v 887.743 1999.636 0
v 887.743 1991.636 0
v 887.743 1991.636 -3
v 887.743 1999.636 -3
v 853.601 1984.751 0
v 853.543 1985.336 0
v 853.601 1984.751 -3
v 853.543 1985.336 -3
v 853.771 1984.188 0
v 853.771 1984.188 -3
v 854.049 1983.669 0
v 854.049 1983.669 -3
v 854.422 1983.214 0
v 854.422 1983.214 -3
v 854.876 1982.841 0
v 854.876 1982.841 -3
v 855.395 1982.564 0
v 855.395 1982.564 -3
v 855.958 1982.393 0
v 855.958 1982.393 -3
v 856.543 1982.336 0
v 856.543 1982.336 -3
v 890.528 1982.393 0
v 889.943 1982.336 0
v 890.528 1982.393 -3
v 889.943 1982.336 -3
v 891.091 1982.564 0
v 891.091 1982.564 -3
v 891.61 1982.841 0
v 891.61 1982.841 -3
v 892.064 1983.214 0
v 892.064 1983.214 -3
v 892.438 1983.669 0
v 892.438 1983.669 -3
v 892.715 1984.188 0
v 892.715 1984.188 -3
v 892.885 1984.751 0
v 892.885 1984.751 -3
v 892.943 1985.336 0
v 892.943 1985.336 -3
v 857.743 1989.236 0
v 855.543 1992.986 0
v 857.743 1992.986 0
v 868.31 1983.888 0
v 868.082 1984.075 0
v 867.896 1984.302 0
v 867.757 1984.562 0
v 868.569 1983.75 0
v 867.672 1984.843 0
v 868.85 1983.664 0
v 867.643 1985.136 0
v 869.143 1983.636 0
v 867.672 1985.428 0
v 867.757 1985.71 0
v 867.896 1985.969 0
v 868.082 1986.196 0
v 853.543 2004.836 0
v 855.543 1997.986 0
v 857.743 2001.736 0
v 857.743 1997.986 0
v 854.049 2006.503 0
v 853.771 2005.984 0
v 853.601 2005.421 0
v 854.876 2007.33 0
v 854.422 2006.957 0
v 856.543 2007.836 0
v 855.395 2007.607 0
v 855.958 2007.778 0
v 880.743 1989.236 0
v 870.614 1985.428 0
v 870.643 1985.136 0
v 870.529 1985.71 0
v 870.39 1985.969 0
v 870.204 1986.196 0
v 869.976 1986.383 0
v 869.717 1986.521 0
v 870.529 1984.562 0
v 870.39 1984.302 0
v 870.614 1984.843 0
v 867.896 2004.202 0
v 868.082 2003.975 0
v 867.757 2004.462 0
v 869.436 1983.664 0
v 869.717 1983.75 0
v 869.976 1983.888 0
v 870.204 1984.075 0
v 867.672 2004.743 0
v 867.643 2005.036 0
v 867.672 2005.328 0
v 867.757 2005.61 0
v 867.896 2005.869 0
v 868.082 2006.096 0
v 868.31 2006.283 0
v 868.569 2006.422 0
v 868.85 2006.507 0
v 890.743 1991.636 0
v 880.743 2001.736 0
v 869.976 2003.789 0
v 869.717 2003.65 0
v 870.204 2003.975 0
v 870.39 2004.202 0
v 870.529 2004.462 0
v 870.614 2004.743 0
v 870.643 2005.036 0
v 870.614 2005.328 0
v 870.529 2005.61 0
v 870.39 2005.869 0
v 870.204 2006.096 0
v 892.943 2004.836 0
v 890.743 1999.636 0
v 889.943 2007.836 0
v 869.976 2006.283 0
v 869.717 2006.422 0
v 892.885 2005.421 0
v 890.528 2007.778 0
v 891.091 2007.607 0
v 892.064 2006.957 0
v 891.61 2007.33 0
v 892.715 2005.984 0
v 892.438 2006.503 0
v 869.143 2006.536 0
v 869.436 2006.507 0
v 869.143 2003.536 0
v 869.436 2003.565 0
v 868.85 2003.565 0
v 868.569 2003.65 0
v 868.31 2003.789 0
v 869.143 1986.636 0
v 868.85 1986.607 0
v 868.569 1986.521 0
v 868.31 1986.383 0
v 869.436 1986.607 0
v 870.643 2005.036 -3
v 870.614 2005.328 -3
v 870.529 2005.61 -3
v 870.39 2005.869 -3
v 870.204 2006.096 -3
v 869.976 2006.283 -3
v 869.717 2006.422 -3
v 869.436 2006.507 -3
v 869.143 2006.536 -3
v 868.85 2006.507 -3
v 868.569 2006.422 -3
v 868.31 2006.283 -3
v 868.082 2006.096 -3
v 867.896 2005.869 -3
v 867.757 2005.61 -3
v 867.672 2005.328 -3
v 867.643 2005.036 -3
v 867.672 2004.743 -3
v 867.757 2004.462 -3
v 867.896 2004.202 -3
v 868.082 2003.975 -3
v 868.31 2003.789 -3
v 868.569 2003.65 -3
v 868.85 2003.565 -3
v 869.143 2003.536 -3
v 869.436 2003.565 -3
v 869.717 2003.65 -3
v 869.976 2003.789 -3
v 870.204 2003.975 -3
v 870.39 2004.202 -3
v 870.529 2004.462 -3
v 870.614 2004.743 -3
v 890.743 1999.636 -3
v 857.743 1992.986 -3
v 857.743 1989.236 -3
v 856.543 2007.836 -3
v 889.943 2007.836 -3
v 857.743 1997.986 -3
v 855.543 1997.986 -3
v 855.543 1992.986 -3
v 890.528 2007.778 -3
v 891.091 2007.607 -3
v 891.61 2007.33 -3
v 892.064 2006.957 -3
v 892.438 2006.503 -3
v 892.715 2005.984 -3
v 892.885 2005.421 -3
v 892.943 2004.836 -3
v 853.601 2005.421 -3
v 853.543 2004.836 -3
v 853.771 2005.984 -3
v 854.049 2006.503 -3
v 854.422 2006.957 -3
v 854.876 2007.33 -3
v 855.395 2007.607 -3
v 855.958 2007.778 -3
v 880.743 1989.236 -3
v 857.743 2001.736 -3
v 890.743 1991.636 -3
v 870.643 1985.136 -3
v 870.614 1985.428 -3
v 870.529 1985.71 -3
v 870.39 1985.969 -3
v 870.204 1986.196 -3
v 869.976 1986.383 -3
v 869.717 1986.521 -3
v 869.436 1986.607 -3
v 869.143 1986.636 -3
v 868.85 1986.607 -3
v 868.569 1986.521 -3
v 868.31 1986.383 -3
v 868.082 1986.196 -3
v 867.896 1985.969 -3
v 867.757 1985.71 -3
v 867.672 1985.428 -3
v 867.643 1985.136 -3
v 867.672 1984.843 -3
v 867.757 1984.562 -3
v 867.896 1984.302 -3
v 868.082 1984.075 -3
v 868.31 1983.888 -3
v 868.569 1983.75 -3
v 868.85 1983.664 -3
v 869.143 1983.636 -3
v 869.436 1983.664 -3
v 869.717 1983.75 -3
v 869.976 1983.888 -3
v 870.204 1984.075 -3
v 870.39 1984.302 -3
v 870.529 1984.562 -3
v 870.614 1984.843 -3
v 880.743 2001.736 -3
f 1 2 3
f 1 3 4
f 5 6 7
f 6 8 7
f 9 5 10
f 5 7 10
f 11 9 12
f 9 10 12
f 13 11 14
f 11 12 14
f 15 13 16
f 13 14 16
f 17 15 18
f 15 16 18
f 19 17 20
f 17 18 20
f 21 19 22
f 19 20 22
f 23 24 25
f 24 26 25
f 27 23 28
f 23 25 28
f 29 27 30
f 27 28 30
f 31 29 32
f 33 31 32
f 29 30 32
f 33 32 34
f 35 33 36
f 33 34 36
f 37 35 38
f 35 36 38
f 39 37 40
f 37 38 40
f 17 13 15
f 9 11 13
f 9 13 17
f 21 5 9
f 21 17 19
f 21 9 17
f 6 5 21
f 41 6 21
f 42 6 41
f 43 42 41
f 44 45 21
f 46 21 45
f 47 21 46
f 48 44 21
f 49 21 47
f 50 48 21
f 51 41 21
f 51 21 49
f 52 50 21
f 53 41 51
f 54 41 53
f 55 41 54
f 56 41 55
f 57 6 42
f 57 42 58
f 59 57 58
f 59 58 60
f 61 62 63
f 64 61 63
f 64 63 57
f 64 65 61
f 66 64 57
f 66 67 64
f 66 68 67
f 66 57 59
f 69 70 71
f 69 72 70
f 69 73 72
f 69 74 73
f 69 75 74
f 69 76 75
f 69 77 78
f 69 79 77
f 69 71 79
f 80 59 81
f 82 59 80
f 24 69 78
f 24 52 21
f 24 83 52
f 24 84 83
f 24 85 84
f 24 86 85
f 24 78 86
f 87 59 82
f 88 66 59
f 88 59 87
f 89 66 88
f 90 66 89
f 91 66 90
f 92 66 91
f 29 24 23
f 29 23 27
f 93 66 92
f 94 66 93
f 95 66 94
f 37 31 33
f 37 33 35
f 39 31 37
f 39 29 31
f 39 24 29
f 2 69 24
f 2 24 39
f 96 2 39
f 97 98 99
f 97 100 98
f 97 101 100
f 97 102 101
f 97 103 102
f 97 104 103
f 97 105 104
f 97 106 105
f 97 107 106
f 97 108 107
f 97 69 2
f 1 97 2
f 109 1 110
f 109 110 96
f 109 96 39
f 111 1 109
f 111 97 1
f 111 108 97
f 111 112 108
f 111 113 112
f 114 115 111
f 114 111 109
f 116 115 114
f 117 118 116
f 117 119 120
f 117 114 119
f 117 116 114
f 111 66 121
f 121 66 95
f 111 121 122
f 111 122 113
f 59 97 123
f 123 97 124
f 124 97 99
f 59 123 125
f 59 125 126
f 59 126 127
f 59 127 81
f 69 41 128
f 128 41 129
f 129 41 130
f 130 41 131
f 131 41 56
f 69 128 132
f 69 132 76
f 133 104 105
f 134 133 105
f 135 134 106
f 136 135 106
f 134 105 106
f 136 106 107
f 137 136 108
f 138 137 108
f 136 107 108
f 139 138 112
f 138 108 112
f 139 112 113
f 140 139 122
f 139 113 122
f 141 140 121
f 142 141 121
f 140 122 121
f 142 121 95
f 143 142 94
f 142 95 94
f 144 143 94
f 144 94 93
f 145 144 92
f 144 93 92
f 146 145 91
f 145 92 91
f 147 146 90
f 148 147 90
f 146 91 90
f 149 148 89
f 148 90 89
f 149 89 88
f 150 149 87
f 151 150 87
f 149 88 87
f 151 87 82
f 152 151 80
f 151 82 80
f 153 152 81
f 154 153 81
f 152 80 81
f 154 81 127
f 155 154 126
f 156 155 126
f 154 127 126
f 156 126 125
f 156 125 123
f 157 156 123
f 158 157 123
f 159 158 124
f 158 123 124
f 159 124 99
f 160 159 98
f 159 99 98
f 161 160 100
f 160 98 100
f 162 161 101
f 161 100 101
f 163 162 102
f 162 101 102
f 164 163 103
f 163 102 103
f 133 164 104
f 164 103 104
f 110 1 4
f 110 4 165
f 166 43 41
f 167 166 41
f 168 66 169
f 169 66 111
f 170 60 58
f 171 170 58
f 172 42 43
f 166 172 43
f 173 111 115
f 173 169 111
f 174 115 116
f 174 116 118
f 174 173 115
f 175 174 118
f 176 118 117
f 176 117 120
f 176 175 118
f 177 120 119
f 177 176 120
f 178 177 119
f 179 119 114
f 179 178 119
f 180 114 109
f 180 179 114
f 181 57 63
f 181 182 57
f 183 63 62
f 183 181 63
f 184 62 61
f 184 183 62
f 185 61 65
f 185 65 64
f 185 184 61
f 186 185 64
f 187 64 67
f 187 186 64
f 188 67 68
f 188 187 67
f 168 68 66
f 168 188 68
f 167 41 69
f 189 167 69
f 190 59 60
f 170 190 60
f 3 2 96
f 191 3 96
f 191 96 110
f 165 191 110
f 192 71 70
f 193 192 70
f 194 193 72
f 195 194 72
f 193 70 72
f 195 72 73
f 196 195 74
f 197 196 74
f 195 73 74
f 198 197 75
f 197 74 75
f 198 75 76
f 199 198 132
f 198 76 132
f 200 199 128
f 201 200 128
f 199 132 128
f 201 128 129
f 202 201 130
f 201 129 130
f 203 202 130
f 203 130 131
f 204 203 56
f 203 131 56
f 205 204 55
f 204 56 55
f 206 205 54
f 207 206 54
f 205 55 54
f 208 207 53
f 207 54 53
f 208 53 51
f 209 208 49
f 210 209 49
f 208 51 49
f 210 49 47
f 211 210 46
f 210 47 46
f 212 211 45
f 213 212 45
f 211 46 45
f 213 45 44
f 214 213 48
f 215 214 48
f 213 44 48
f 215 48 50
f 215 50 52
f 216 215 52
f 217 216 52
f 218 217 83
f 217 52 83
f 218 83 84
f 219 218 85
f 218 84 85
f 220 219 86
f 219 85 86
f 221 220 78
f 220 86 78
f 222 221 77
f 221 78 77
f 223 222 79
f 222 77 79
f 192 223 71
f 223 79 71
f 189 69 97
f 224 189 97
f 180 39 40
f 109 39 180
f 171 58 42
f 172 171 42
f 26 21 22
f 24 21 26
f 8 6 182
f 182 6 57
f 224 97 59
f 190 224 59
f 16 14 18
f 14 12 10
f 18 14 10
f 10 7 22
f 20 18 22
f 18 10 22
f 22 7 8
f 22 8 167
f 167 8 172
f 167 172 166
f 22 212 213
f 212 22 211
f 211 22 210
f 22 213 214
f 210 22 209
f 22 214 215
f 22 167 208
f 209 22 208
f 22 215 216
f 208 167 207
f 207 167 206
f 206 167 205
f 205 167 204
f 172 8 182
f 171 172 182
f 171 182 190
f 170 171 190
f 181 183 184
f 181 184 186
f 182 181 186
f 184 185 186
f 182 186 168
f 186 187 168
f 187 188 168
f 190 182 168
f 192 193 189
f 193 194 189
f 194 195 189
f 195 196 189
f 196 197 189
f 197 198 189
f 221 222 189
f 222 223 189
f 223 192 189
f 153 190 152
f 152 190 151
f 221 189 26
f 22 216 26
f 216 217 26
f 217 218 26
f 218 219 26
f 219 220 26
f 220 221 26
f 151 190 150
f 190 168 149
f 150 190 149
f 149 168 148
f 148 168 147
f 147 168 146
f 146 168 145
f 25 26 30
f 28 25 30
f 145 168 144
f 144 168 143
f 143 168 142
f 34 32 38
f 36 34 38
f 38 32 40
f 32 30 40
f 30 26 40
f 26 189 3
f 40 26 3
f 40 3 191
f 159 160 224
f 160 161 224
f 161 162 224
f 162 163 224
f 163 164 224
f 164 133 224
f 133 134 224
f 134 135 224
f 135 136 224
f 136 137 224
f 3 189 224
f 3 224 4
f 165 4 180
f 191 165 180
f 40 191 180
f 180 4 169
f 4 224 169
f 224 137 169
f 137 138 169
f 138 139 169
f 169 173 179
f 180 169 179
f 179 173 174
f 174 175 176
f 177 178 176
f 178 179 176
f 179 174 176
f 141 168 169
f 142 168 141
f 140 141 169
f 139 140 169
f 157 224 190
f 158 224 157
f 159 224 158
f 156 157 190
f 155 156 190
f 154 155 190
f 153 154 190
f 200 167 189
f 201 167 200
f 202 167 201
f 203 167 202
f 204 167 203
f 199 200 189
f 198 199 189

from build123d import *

# Parameters (mm, degrees)
ESQUISSE1_W               = 39.4
ESQUISSE1_H               = 25.5
ESQUISSE1_R               = 1.5
ESQUISSE1_W_2             = 3
ESQUISSE1_H_2             = 8
T_LE_DE_BASE_PLI_E1_DEPTH = 3
CONG_1_R                  = 3


# Sheet-metal steps are written as plain solids
with BuildPart() as part:
    # Esquisse1 → Tôle de base pliée1 (new body)
    with BuildSketch(Plane.XY):
        with Locations((873.243101599, 1995.085790402)):
            Rectangle(ESQUISSE1_W, ESQUISSE1_H)
        with Locations((869.143101599, 2005.035790402)):
            Circle(ESQUISSE1_R, mode=Mode.SUBTRACT)
        with Locations((869.143101599, 1985.135577488)):
            Circle(ESQUISSE1_R, mode=Mode.SUBTRACT)
        Polygon((857.743101599, 1997.985790402), (855.543101599, 1997.985790402), (855.543101599, 1992.985790402), (857.743101599, 1992.985790402), (857.743101599, 1989.235790402), (880.743101599, 1989.235790402), (880.743101599, 2001.735790402), (857.743101599, 2001.735790402), align=None, mode=Mode.SUBTRACT)
        with Locations((889.243101599, 1995.635790402)):
            Rectangle(ESQUISSE1_W_2, ESQUISSE1_H_2, mode=Mode.SUBTRACT)
    extrude(amount=-T_LE_DE_BASE_PLI_E1_DEPTH)

    # Congé1
    cong_1_edges = [part.edges().sort_by_distance(p)[0] for p in [
        (853.543101599, 2007.835790402, -1.5),
        (892.943101599, 2007.835790402, -1.5),
        (892.943101599, 1982.335790402, -1.5),
        (853.543101599, 1982.335790402, -1.5),
    ]]
    fillet(cong_1_edges, radius=CONG_1_R)


solid = part.part
